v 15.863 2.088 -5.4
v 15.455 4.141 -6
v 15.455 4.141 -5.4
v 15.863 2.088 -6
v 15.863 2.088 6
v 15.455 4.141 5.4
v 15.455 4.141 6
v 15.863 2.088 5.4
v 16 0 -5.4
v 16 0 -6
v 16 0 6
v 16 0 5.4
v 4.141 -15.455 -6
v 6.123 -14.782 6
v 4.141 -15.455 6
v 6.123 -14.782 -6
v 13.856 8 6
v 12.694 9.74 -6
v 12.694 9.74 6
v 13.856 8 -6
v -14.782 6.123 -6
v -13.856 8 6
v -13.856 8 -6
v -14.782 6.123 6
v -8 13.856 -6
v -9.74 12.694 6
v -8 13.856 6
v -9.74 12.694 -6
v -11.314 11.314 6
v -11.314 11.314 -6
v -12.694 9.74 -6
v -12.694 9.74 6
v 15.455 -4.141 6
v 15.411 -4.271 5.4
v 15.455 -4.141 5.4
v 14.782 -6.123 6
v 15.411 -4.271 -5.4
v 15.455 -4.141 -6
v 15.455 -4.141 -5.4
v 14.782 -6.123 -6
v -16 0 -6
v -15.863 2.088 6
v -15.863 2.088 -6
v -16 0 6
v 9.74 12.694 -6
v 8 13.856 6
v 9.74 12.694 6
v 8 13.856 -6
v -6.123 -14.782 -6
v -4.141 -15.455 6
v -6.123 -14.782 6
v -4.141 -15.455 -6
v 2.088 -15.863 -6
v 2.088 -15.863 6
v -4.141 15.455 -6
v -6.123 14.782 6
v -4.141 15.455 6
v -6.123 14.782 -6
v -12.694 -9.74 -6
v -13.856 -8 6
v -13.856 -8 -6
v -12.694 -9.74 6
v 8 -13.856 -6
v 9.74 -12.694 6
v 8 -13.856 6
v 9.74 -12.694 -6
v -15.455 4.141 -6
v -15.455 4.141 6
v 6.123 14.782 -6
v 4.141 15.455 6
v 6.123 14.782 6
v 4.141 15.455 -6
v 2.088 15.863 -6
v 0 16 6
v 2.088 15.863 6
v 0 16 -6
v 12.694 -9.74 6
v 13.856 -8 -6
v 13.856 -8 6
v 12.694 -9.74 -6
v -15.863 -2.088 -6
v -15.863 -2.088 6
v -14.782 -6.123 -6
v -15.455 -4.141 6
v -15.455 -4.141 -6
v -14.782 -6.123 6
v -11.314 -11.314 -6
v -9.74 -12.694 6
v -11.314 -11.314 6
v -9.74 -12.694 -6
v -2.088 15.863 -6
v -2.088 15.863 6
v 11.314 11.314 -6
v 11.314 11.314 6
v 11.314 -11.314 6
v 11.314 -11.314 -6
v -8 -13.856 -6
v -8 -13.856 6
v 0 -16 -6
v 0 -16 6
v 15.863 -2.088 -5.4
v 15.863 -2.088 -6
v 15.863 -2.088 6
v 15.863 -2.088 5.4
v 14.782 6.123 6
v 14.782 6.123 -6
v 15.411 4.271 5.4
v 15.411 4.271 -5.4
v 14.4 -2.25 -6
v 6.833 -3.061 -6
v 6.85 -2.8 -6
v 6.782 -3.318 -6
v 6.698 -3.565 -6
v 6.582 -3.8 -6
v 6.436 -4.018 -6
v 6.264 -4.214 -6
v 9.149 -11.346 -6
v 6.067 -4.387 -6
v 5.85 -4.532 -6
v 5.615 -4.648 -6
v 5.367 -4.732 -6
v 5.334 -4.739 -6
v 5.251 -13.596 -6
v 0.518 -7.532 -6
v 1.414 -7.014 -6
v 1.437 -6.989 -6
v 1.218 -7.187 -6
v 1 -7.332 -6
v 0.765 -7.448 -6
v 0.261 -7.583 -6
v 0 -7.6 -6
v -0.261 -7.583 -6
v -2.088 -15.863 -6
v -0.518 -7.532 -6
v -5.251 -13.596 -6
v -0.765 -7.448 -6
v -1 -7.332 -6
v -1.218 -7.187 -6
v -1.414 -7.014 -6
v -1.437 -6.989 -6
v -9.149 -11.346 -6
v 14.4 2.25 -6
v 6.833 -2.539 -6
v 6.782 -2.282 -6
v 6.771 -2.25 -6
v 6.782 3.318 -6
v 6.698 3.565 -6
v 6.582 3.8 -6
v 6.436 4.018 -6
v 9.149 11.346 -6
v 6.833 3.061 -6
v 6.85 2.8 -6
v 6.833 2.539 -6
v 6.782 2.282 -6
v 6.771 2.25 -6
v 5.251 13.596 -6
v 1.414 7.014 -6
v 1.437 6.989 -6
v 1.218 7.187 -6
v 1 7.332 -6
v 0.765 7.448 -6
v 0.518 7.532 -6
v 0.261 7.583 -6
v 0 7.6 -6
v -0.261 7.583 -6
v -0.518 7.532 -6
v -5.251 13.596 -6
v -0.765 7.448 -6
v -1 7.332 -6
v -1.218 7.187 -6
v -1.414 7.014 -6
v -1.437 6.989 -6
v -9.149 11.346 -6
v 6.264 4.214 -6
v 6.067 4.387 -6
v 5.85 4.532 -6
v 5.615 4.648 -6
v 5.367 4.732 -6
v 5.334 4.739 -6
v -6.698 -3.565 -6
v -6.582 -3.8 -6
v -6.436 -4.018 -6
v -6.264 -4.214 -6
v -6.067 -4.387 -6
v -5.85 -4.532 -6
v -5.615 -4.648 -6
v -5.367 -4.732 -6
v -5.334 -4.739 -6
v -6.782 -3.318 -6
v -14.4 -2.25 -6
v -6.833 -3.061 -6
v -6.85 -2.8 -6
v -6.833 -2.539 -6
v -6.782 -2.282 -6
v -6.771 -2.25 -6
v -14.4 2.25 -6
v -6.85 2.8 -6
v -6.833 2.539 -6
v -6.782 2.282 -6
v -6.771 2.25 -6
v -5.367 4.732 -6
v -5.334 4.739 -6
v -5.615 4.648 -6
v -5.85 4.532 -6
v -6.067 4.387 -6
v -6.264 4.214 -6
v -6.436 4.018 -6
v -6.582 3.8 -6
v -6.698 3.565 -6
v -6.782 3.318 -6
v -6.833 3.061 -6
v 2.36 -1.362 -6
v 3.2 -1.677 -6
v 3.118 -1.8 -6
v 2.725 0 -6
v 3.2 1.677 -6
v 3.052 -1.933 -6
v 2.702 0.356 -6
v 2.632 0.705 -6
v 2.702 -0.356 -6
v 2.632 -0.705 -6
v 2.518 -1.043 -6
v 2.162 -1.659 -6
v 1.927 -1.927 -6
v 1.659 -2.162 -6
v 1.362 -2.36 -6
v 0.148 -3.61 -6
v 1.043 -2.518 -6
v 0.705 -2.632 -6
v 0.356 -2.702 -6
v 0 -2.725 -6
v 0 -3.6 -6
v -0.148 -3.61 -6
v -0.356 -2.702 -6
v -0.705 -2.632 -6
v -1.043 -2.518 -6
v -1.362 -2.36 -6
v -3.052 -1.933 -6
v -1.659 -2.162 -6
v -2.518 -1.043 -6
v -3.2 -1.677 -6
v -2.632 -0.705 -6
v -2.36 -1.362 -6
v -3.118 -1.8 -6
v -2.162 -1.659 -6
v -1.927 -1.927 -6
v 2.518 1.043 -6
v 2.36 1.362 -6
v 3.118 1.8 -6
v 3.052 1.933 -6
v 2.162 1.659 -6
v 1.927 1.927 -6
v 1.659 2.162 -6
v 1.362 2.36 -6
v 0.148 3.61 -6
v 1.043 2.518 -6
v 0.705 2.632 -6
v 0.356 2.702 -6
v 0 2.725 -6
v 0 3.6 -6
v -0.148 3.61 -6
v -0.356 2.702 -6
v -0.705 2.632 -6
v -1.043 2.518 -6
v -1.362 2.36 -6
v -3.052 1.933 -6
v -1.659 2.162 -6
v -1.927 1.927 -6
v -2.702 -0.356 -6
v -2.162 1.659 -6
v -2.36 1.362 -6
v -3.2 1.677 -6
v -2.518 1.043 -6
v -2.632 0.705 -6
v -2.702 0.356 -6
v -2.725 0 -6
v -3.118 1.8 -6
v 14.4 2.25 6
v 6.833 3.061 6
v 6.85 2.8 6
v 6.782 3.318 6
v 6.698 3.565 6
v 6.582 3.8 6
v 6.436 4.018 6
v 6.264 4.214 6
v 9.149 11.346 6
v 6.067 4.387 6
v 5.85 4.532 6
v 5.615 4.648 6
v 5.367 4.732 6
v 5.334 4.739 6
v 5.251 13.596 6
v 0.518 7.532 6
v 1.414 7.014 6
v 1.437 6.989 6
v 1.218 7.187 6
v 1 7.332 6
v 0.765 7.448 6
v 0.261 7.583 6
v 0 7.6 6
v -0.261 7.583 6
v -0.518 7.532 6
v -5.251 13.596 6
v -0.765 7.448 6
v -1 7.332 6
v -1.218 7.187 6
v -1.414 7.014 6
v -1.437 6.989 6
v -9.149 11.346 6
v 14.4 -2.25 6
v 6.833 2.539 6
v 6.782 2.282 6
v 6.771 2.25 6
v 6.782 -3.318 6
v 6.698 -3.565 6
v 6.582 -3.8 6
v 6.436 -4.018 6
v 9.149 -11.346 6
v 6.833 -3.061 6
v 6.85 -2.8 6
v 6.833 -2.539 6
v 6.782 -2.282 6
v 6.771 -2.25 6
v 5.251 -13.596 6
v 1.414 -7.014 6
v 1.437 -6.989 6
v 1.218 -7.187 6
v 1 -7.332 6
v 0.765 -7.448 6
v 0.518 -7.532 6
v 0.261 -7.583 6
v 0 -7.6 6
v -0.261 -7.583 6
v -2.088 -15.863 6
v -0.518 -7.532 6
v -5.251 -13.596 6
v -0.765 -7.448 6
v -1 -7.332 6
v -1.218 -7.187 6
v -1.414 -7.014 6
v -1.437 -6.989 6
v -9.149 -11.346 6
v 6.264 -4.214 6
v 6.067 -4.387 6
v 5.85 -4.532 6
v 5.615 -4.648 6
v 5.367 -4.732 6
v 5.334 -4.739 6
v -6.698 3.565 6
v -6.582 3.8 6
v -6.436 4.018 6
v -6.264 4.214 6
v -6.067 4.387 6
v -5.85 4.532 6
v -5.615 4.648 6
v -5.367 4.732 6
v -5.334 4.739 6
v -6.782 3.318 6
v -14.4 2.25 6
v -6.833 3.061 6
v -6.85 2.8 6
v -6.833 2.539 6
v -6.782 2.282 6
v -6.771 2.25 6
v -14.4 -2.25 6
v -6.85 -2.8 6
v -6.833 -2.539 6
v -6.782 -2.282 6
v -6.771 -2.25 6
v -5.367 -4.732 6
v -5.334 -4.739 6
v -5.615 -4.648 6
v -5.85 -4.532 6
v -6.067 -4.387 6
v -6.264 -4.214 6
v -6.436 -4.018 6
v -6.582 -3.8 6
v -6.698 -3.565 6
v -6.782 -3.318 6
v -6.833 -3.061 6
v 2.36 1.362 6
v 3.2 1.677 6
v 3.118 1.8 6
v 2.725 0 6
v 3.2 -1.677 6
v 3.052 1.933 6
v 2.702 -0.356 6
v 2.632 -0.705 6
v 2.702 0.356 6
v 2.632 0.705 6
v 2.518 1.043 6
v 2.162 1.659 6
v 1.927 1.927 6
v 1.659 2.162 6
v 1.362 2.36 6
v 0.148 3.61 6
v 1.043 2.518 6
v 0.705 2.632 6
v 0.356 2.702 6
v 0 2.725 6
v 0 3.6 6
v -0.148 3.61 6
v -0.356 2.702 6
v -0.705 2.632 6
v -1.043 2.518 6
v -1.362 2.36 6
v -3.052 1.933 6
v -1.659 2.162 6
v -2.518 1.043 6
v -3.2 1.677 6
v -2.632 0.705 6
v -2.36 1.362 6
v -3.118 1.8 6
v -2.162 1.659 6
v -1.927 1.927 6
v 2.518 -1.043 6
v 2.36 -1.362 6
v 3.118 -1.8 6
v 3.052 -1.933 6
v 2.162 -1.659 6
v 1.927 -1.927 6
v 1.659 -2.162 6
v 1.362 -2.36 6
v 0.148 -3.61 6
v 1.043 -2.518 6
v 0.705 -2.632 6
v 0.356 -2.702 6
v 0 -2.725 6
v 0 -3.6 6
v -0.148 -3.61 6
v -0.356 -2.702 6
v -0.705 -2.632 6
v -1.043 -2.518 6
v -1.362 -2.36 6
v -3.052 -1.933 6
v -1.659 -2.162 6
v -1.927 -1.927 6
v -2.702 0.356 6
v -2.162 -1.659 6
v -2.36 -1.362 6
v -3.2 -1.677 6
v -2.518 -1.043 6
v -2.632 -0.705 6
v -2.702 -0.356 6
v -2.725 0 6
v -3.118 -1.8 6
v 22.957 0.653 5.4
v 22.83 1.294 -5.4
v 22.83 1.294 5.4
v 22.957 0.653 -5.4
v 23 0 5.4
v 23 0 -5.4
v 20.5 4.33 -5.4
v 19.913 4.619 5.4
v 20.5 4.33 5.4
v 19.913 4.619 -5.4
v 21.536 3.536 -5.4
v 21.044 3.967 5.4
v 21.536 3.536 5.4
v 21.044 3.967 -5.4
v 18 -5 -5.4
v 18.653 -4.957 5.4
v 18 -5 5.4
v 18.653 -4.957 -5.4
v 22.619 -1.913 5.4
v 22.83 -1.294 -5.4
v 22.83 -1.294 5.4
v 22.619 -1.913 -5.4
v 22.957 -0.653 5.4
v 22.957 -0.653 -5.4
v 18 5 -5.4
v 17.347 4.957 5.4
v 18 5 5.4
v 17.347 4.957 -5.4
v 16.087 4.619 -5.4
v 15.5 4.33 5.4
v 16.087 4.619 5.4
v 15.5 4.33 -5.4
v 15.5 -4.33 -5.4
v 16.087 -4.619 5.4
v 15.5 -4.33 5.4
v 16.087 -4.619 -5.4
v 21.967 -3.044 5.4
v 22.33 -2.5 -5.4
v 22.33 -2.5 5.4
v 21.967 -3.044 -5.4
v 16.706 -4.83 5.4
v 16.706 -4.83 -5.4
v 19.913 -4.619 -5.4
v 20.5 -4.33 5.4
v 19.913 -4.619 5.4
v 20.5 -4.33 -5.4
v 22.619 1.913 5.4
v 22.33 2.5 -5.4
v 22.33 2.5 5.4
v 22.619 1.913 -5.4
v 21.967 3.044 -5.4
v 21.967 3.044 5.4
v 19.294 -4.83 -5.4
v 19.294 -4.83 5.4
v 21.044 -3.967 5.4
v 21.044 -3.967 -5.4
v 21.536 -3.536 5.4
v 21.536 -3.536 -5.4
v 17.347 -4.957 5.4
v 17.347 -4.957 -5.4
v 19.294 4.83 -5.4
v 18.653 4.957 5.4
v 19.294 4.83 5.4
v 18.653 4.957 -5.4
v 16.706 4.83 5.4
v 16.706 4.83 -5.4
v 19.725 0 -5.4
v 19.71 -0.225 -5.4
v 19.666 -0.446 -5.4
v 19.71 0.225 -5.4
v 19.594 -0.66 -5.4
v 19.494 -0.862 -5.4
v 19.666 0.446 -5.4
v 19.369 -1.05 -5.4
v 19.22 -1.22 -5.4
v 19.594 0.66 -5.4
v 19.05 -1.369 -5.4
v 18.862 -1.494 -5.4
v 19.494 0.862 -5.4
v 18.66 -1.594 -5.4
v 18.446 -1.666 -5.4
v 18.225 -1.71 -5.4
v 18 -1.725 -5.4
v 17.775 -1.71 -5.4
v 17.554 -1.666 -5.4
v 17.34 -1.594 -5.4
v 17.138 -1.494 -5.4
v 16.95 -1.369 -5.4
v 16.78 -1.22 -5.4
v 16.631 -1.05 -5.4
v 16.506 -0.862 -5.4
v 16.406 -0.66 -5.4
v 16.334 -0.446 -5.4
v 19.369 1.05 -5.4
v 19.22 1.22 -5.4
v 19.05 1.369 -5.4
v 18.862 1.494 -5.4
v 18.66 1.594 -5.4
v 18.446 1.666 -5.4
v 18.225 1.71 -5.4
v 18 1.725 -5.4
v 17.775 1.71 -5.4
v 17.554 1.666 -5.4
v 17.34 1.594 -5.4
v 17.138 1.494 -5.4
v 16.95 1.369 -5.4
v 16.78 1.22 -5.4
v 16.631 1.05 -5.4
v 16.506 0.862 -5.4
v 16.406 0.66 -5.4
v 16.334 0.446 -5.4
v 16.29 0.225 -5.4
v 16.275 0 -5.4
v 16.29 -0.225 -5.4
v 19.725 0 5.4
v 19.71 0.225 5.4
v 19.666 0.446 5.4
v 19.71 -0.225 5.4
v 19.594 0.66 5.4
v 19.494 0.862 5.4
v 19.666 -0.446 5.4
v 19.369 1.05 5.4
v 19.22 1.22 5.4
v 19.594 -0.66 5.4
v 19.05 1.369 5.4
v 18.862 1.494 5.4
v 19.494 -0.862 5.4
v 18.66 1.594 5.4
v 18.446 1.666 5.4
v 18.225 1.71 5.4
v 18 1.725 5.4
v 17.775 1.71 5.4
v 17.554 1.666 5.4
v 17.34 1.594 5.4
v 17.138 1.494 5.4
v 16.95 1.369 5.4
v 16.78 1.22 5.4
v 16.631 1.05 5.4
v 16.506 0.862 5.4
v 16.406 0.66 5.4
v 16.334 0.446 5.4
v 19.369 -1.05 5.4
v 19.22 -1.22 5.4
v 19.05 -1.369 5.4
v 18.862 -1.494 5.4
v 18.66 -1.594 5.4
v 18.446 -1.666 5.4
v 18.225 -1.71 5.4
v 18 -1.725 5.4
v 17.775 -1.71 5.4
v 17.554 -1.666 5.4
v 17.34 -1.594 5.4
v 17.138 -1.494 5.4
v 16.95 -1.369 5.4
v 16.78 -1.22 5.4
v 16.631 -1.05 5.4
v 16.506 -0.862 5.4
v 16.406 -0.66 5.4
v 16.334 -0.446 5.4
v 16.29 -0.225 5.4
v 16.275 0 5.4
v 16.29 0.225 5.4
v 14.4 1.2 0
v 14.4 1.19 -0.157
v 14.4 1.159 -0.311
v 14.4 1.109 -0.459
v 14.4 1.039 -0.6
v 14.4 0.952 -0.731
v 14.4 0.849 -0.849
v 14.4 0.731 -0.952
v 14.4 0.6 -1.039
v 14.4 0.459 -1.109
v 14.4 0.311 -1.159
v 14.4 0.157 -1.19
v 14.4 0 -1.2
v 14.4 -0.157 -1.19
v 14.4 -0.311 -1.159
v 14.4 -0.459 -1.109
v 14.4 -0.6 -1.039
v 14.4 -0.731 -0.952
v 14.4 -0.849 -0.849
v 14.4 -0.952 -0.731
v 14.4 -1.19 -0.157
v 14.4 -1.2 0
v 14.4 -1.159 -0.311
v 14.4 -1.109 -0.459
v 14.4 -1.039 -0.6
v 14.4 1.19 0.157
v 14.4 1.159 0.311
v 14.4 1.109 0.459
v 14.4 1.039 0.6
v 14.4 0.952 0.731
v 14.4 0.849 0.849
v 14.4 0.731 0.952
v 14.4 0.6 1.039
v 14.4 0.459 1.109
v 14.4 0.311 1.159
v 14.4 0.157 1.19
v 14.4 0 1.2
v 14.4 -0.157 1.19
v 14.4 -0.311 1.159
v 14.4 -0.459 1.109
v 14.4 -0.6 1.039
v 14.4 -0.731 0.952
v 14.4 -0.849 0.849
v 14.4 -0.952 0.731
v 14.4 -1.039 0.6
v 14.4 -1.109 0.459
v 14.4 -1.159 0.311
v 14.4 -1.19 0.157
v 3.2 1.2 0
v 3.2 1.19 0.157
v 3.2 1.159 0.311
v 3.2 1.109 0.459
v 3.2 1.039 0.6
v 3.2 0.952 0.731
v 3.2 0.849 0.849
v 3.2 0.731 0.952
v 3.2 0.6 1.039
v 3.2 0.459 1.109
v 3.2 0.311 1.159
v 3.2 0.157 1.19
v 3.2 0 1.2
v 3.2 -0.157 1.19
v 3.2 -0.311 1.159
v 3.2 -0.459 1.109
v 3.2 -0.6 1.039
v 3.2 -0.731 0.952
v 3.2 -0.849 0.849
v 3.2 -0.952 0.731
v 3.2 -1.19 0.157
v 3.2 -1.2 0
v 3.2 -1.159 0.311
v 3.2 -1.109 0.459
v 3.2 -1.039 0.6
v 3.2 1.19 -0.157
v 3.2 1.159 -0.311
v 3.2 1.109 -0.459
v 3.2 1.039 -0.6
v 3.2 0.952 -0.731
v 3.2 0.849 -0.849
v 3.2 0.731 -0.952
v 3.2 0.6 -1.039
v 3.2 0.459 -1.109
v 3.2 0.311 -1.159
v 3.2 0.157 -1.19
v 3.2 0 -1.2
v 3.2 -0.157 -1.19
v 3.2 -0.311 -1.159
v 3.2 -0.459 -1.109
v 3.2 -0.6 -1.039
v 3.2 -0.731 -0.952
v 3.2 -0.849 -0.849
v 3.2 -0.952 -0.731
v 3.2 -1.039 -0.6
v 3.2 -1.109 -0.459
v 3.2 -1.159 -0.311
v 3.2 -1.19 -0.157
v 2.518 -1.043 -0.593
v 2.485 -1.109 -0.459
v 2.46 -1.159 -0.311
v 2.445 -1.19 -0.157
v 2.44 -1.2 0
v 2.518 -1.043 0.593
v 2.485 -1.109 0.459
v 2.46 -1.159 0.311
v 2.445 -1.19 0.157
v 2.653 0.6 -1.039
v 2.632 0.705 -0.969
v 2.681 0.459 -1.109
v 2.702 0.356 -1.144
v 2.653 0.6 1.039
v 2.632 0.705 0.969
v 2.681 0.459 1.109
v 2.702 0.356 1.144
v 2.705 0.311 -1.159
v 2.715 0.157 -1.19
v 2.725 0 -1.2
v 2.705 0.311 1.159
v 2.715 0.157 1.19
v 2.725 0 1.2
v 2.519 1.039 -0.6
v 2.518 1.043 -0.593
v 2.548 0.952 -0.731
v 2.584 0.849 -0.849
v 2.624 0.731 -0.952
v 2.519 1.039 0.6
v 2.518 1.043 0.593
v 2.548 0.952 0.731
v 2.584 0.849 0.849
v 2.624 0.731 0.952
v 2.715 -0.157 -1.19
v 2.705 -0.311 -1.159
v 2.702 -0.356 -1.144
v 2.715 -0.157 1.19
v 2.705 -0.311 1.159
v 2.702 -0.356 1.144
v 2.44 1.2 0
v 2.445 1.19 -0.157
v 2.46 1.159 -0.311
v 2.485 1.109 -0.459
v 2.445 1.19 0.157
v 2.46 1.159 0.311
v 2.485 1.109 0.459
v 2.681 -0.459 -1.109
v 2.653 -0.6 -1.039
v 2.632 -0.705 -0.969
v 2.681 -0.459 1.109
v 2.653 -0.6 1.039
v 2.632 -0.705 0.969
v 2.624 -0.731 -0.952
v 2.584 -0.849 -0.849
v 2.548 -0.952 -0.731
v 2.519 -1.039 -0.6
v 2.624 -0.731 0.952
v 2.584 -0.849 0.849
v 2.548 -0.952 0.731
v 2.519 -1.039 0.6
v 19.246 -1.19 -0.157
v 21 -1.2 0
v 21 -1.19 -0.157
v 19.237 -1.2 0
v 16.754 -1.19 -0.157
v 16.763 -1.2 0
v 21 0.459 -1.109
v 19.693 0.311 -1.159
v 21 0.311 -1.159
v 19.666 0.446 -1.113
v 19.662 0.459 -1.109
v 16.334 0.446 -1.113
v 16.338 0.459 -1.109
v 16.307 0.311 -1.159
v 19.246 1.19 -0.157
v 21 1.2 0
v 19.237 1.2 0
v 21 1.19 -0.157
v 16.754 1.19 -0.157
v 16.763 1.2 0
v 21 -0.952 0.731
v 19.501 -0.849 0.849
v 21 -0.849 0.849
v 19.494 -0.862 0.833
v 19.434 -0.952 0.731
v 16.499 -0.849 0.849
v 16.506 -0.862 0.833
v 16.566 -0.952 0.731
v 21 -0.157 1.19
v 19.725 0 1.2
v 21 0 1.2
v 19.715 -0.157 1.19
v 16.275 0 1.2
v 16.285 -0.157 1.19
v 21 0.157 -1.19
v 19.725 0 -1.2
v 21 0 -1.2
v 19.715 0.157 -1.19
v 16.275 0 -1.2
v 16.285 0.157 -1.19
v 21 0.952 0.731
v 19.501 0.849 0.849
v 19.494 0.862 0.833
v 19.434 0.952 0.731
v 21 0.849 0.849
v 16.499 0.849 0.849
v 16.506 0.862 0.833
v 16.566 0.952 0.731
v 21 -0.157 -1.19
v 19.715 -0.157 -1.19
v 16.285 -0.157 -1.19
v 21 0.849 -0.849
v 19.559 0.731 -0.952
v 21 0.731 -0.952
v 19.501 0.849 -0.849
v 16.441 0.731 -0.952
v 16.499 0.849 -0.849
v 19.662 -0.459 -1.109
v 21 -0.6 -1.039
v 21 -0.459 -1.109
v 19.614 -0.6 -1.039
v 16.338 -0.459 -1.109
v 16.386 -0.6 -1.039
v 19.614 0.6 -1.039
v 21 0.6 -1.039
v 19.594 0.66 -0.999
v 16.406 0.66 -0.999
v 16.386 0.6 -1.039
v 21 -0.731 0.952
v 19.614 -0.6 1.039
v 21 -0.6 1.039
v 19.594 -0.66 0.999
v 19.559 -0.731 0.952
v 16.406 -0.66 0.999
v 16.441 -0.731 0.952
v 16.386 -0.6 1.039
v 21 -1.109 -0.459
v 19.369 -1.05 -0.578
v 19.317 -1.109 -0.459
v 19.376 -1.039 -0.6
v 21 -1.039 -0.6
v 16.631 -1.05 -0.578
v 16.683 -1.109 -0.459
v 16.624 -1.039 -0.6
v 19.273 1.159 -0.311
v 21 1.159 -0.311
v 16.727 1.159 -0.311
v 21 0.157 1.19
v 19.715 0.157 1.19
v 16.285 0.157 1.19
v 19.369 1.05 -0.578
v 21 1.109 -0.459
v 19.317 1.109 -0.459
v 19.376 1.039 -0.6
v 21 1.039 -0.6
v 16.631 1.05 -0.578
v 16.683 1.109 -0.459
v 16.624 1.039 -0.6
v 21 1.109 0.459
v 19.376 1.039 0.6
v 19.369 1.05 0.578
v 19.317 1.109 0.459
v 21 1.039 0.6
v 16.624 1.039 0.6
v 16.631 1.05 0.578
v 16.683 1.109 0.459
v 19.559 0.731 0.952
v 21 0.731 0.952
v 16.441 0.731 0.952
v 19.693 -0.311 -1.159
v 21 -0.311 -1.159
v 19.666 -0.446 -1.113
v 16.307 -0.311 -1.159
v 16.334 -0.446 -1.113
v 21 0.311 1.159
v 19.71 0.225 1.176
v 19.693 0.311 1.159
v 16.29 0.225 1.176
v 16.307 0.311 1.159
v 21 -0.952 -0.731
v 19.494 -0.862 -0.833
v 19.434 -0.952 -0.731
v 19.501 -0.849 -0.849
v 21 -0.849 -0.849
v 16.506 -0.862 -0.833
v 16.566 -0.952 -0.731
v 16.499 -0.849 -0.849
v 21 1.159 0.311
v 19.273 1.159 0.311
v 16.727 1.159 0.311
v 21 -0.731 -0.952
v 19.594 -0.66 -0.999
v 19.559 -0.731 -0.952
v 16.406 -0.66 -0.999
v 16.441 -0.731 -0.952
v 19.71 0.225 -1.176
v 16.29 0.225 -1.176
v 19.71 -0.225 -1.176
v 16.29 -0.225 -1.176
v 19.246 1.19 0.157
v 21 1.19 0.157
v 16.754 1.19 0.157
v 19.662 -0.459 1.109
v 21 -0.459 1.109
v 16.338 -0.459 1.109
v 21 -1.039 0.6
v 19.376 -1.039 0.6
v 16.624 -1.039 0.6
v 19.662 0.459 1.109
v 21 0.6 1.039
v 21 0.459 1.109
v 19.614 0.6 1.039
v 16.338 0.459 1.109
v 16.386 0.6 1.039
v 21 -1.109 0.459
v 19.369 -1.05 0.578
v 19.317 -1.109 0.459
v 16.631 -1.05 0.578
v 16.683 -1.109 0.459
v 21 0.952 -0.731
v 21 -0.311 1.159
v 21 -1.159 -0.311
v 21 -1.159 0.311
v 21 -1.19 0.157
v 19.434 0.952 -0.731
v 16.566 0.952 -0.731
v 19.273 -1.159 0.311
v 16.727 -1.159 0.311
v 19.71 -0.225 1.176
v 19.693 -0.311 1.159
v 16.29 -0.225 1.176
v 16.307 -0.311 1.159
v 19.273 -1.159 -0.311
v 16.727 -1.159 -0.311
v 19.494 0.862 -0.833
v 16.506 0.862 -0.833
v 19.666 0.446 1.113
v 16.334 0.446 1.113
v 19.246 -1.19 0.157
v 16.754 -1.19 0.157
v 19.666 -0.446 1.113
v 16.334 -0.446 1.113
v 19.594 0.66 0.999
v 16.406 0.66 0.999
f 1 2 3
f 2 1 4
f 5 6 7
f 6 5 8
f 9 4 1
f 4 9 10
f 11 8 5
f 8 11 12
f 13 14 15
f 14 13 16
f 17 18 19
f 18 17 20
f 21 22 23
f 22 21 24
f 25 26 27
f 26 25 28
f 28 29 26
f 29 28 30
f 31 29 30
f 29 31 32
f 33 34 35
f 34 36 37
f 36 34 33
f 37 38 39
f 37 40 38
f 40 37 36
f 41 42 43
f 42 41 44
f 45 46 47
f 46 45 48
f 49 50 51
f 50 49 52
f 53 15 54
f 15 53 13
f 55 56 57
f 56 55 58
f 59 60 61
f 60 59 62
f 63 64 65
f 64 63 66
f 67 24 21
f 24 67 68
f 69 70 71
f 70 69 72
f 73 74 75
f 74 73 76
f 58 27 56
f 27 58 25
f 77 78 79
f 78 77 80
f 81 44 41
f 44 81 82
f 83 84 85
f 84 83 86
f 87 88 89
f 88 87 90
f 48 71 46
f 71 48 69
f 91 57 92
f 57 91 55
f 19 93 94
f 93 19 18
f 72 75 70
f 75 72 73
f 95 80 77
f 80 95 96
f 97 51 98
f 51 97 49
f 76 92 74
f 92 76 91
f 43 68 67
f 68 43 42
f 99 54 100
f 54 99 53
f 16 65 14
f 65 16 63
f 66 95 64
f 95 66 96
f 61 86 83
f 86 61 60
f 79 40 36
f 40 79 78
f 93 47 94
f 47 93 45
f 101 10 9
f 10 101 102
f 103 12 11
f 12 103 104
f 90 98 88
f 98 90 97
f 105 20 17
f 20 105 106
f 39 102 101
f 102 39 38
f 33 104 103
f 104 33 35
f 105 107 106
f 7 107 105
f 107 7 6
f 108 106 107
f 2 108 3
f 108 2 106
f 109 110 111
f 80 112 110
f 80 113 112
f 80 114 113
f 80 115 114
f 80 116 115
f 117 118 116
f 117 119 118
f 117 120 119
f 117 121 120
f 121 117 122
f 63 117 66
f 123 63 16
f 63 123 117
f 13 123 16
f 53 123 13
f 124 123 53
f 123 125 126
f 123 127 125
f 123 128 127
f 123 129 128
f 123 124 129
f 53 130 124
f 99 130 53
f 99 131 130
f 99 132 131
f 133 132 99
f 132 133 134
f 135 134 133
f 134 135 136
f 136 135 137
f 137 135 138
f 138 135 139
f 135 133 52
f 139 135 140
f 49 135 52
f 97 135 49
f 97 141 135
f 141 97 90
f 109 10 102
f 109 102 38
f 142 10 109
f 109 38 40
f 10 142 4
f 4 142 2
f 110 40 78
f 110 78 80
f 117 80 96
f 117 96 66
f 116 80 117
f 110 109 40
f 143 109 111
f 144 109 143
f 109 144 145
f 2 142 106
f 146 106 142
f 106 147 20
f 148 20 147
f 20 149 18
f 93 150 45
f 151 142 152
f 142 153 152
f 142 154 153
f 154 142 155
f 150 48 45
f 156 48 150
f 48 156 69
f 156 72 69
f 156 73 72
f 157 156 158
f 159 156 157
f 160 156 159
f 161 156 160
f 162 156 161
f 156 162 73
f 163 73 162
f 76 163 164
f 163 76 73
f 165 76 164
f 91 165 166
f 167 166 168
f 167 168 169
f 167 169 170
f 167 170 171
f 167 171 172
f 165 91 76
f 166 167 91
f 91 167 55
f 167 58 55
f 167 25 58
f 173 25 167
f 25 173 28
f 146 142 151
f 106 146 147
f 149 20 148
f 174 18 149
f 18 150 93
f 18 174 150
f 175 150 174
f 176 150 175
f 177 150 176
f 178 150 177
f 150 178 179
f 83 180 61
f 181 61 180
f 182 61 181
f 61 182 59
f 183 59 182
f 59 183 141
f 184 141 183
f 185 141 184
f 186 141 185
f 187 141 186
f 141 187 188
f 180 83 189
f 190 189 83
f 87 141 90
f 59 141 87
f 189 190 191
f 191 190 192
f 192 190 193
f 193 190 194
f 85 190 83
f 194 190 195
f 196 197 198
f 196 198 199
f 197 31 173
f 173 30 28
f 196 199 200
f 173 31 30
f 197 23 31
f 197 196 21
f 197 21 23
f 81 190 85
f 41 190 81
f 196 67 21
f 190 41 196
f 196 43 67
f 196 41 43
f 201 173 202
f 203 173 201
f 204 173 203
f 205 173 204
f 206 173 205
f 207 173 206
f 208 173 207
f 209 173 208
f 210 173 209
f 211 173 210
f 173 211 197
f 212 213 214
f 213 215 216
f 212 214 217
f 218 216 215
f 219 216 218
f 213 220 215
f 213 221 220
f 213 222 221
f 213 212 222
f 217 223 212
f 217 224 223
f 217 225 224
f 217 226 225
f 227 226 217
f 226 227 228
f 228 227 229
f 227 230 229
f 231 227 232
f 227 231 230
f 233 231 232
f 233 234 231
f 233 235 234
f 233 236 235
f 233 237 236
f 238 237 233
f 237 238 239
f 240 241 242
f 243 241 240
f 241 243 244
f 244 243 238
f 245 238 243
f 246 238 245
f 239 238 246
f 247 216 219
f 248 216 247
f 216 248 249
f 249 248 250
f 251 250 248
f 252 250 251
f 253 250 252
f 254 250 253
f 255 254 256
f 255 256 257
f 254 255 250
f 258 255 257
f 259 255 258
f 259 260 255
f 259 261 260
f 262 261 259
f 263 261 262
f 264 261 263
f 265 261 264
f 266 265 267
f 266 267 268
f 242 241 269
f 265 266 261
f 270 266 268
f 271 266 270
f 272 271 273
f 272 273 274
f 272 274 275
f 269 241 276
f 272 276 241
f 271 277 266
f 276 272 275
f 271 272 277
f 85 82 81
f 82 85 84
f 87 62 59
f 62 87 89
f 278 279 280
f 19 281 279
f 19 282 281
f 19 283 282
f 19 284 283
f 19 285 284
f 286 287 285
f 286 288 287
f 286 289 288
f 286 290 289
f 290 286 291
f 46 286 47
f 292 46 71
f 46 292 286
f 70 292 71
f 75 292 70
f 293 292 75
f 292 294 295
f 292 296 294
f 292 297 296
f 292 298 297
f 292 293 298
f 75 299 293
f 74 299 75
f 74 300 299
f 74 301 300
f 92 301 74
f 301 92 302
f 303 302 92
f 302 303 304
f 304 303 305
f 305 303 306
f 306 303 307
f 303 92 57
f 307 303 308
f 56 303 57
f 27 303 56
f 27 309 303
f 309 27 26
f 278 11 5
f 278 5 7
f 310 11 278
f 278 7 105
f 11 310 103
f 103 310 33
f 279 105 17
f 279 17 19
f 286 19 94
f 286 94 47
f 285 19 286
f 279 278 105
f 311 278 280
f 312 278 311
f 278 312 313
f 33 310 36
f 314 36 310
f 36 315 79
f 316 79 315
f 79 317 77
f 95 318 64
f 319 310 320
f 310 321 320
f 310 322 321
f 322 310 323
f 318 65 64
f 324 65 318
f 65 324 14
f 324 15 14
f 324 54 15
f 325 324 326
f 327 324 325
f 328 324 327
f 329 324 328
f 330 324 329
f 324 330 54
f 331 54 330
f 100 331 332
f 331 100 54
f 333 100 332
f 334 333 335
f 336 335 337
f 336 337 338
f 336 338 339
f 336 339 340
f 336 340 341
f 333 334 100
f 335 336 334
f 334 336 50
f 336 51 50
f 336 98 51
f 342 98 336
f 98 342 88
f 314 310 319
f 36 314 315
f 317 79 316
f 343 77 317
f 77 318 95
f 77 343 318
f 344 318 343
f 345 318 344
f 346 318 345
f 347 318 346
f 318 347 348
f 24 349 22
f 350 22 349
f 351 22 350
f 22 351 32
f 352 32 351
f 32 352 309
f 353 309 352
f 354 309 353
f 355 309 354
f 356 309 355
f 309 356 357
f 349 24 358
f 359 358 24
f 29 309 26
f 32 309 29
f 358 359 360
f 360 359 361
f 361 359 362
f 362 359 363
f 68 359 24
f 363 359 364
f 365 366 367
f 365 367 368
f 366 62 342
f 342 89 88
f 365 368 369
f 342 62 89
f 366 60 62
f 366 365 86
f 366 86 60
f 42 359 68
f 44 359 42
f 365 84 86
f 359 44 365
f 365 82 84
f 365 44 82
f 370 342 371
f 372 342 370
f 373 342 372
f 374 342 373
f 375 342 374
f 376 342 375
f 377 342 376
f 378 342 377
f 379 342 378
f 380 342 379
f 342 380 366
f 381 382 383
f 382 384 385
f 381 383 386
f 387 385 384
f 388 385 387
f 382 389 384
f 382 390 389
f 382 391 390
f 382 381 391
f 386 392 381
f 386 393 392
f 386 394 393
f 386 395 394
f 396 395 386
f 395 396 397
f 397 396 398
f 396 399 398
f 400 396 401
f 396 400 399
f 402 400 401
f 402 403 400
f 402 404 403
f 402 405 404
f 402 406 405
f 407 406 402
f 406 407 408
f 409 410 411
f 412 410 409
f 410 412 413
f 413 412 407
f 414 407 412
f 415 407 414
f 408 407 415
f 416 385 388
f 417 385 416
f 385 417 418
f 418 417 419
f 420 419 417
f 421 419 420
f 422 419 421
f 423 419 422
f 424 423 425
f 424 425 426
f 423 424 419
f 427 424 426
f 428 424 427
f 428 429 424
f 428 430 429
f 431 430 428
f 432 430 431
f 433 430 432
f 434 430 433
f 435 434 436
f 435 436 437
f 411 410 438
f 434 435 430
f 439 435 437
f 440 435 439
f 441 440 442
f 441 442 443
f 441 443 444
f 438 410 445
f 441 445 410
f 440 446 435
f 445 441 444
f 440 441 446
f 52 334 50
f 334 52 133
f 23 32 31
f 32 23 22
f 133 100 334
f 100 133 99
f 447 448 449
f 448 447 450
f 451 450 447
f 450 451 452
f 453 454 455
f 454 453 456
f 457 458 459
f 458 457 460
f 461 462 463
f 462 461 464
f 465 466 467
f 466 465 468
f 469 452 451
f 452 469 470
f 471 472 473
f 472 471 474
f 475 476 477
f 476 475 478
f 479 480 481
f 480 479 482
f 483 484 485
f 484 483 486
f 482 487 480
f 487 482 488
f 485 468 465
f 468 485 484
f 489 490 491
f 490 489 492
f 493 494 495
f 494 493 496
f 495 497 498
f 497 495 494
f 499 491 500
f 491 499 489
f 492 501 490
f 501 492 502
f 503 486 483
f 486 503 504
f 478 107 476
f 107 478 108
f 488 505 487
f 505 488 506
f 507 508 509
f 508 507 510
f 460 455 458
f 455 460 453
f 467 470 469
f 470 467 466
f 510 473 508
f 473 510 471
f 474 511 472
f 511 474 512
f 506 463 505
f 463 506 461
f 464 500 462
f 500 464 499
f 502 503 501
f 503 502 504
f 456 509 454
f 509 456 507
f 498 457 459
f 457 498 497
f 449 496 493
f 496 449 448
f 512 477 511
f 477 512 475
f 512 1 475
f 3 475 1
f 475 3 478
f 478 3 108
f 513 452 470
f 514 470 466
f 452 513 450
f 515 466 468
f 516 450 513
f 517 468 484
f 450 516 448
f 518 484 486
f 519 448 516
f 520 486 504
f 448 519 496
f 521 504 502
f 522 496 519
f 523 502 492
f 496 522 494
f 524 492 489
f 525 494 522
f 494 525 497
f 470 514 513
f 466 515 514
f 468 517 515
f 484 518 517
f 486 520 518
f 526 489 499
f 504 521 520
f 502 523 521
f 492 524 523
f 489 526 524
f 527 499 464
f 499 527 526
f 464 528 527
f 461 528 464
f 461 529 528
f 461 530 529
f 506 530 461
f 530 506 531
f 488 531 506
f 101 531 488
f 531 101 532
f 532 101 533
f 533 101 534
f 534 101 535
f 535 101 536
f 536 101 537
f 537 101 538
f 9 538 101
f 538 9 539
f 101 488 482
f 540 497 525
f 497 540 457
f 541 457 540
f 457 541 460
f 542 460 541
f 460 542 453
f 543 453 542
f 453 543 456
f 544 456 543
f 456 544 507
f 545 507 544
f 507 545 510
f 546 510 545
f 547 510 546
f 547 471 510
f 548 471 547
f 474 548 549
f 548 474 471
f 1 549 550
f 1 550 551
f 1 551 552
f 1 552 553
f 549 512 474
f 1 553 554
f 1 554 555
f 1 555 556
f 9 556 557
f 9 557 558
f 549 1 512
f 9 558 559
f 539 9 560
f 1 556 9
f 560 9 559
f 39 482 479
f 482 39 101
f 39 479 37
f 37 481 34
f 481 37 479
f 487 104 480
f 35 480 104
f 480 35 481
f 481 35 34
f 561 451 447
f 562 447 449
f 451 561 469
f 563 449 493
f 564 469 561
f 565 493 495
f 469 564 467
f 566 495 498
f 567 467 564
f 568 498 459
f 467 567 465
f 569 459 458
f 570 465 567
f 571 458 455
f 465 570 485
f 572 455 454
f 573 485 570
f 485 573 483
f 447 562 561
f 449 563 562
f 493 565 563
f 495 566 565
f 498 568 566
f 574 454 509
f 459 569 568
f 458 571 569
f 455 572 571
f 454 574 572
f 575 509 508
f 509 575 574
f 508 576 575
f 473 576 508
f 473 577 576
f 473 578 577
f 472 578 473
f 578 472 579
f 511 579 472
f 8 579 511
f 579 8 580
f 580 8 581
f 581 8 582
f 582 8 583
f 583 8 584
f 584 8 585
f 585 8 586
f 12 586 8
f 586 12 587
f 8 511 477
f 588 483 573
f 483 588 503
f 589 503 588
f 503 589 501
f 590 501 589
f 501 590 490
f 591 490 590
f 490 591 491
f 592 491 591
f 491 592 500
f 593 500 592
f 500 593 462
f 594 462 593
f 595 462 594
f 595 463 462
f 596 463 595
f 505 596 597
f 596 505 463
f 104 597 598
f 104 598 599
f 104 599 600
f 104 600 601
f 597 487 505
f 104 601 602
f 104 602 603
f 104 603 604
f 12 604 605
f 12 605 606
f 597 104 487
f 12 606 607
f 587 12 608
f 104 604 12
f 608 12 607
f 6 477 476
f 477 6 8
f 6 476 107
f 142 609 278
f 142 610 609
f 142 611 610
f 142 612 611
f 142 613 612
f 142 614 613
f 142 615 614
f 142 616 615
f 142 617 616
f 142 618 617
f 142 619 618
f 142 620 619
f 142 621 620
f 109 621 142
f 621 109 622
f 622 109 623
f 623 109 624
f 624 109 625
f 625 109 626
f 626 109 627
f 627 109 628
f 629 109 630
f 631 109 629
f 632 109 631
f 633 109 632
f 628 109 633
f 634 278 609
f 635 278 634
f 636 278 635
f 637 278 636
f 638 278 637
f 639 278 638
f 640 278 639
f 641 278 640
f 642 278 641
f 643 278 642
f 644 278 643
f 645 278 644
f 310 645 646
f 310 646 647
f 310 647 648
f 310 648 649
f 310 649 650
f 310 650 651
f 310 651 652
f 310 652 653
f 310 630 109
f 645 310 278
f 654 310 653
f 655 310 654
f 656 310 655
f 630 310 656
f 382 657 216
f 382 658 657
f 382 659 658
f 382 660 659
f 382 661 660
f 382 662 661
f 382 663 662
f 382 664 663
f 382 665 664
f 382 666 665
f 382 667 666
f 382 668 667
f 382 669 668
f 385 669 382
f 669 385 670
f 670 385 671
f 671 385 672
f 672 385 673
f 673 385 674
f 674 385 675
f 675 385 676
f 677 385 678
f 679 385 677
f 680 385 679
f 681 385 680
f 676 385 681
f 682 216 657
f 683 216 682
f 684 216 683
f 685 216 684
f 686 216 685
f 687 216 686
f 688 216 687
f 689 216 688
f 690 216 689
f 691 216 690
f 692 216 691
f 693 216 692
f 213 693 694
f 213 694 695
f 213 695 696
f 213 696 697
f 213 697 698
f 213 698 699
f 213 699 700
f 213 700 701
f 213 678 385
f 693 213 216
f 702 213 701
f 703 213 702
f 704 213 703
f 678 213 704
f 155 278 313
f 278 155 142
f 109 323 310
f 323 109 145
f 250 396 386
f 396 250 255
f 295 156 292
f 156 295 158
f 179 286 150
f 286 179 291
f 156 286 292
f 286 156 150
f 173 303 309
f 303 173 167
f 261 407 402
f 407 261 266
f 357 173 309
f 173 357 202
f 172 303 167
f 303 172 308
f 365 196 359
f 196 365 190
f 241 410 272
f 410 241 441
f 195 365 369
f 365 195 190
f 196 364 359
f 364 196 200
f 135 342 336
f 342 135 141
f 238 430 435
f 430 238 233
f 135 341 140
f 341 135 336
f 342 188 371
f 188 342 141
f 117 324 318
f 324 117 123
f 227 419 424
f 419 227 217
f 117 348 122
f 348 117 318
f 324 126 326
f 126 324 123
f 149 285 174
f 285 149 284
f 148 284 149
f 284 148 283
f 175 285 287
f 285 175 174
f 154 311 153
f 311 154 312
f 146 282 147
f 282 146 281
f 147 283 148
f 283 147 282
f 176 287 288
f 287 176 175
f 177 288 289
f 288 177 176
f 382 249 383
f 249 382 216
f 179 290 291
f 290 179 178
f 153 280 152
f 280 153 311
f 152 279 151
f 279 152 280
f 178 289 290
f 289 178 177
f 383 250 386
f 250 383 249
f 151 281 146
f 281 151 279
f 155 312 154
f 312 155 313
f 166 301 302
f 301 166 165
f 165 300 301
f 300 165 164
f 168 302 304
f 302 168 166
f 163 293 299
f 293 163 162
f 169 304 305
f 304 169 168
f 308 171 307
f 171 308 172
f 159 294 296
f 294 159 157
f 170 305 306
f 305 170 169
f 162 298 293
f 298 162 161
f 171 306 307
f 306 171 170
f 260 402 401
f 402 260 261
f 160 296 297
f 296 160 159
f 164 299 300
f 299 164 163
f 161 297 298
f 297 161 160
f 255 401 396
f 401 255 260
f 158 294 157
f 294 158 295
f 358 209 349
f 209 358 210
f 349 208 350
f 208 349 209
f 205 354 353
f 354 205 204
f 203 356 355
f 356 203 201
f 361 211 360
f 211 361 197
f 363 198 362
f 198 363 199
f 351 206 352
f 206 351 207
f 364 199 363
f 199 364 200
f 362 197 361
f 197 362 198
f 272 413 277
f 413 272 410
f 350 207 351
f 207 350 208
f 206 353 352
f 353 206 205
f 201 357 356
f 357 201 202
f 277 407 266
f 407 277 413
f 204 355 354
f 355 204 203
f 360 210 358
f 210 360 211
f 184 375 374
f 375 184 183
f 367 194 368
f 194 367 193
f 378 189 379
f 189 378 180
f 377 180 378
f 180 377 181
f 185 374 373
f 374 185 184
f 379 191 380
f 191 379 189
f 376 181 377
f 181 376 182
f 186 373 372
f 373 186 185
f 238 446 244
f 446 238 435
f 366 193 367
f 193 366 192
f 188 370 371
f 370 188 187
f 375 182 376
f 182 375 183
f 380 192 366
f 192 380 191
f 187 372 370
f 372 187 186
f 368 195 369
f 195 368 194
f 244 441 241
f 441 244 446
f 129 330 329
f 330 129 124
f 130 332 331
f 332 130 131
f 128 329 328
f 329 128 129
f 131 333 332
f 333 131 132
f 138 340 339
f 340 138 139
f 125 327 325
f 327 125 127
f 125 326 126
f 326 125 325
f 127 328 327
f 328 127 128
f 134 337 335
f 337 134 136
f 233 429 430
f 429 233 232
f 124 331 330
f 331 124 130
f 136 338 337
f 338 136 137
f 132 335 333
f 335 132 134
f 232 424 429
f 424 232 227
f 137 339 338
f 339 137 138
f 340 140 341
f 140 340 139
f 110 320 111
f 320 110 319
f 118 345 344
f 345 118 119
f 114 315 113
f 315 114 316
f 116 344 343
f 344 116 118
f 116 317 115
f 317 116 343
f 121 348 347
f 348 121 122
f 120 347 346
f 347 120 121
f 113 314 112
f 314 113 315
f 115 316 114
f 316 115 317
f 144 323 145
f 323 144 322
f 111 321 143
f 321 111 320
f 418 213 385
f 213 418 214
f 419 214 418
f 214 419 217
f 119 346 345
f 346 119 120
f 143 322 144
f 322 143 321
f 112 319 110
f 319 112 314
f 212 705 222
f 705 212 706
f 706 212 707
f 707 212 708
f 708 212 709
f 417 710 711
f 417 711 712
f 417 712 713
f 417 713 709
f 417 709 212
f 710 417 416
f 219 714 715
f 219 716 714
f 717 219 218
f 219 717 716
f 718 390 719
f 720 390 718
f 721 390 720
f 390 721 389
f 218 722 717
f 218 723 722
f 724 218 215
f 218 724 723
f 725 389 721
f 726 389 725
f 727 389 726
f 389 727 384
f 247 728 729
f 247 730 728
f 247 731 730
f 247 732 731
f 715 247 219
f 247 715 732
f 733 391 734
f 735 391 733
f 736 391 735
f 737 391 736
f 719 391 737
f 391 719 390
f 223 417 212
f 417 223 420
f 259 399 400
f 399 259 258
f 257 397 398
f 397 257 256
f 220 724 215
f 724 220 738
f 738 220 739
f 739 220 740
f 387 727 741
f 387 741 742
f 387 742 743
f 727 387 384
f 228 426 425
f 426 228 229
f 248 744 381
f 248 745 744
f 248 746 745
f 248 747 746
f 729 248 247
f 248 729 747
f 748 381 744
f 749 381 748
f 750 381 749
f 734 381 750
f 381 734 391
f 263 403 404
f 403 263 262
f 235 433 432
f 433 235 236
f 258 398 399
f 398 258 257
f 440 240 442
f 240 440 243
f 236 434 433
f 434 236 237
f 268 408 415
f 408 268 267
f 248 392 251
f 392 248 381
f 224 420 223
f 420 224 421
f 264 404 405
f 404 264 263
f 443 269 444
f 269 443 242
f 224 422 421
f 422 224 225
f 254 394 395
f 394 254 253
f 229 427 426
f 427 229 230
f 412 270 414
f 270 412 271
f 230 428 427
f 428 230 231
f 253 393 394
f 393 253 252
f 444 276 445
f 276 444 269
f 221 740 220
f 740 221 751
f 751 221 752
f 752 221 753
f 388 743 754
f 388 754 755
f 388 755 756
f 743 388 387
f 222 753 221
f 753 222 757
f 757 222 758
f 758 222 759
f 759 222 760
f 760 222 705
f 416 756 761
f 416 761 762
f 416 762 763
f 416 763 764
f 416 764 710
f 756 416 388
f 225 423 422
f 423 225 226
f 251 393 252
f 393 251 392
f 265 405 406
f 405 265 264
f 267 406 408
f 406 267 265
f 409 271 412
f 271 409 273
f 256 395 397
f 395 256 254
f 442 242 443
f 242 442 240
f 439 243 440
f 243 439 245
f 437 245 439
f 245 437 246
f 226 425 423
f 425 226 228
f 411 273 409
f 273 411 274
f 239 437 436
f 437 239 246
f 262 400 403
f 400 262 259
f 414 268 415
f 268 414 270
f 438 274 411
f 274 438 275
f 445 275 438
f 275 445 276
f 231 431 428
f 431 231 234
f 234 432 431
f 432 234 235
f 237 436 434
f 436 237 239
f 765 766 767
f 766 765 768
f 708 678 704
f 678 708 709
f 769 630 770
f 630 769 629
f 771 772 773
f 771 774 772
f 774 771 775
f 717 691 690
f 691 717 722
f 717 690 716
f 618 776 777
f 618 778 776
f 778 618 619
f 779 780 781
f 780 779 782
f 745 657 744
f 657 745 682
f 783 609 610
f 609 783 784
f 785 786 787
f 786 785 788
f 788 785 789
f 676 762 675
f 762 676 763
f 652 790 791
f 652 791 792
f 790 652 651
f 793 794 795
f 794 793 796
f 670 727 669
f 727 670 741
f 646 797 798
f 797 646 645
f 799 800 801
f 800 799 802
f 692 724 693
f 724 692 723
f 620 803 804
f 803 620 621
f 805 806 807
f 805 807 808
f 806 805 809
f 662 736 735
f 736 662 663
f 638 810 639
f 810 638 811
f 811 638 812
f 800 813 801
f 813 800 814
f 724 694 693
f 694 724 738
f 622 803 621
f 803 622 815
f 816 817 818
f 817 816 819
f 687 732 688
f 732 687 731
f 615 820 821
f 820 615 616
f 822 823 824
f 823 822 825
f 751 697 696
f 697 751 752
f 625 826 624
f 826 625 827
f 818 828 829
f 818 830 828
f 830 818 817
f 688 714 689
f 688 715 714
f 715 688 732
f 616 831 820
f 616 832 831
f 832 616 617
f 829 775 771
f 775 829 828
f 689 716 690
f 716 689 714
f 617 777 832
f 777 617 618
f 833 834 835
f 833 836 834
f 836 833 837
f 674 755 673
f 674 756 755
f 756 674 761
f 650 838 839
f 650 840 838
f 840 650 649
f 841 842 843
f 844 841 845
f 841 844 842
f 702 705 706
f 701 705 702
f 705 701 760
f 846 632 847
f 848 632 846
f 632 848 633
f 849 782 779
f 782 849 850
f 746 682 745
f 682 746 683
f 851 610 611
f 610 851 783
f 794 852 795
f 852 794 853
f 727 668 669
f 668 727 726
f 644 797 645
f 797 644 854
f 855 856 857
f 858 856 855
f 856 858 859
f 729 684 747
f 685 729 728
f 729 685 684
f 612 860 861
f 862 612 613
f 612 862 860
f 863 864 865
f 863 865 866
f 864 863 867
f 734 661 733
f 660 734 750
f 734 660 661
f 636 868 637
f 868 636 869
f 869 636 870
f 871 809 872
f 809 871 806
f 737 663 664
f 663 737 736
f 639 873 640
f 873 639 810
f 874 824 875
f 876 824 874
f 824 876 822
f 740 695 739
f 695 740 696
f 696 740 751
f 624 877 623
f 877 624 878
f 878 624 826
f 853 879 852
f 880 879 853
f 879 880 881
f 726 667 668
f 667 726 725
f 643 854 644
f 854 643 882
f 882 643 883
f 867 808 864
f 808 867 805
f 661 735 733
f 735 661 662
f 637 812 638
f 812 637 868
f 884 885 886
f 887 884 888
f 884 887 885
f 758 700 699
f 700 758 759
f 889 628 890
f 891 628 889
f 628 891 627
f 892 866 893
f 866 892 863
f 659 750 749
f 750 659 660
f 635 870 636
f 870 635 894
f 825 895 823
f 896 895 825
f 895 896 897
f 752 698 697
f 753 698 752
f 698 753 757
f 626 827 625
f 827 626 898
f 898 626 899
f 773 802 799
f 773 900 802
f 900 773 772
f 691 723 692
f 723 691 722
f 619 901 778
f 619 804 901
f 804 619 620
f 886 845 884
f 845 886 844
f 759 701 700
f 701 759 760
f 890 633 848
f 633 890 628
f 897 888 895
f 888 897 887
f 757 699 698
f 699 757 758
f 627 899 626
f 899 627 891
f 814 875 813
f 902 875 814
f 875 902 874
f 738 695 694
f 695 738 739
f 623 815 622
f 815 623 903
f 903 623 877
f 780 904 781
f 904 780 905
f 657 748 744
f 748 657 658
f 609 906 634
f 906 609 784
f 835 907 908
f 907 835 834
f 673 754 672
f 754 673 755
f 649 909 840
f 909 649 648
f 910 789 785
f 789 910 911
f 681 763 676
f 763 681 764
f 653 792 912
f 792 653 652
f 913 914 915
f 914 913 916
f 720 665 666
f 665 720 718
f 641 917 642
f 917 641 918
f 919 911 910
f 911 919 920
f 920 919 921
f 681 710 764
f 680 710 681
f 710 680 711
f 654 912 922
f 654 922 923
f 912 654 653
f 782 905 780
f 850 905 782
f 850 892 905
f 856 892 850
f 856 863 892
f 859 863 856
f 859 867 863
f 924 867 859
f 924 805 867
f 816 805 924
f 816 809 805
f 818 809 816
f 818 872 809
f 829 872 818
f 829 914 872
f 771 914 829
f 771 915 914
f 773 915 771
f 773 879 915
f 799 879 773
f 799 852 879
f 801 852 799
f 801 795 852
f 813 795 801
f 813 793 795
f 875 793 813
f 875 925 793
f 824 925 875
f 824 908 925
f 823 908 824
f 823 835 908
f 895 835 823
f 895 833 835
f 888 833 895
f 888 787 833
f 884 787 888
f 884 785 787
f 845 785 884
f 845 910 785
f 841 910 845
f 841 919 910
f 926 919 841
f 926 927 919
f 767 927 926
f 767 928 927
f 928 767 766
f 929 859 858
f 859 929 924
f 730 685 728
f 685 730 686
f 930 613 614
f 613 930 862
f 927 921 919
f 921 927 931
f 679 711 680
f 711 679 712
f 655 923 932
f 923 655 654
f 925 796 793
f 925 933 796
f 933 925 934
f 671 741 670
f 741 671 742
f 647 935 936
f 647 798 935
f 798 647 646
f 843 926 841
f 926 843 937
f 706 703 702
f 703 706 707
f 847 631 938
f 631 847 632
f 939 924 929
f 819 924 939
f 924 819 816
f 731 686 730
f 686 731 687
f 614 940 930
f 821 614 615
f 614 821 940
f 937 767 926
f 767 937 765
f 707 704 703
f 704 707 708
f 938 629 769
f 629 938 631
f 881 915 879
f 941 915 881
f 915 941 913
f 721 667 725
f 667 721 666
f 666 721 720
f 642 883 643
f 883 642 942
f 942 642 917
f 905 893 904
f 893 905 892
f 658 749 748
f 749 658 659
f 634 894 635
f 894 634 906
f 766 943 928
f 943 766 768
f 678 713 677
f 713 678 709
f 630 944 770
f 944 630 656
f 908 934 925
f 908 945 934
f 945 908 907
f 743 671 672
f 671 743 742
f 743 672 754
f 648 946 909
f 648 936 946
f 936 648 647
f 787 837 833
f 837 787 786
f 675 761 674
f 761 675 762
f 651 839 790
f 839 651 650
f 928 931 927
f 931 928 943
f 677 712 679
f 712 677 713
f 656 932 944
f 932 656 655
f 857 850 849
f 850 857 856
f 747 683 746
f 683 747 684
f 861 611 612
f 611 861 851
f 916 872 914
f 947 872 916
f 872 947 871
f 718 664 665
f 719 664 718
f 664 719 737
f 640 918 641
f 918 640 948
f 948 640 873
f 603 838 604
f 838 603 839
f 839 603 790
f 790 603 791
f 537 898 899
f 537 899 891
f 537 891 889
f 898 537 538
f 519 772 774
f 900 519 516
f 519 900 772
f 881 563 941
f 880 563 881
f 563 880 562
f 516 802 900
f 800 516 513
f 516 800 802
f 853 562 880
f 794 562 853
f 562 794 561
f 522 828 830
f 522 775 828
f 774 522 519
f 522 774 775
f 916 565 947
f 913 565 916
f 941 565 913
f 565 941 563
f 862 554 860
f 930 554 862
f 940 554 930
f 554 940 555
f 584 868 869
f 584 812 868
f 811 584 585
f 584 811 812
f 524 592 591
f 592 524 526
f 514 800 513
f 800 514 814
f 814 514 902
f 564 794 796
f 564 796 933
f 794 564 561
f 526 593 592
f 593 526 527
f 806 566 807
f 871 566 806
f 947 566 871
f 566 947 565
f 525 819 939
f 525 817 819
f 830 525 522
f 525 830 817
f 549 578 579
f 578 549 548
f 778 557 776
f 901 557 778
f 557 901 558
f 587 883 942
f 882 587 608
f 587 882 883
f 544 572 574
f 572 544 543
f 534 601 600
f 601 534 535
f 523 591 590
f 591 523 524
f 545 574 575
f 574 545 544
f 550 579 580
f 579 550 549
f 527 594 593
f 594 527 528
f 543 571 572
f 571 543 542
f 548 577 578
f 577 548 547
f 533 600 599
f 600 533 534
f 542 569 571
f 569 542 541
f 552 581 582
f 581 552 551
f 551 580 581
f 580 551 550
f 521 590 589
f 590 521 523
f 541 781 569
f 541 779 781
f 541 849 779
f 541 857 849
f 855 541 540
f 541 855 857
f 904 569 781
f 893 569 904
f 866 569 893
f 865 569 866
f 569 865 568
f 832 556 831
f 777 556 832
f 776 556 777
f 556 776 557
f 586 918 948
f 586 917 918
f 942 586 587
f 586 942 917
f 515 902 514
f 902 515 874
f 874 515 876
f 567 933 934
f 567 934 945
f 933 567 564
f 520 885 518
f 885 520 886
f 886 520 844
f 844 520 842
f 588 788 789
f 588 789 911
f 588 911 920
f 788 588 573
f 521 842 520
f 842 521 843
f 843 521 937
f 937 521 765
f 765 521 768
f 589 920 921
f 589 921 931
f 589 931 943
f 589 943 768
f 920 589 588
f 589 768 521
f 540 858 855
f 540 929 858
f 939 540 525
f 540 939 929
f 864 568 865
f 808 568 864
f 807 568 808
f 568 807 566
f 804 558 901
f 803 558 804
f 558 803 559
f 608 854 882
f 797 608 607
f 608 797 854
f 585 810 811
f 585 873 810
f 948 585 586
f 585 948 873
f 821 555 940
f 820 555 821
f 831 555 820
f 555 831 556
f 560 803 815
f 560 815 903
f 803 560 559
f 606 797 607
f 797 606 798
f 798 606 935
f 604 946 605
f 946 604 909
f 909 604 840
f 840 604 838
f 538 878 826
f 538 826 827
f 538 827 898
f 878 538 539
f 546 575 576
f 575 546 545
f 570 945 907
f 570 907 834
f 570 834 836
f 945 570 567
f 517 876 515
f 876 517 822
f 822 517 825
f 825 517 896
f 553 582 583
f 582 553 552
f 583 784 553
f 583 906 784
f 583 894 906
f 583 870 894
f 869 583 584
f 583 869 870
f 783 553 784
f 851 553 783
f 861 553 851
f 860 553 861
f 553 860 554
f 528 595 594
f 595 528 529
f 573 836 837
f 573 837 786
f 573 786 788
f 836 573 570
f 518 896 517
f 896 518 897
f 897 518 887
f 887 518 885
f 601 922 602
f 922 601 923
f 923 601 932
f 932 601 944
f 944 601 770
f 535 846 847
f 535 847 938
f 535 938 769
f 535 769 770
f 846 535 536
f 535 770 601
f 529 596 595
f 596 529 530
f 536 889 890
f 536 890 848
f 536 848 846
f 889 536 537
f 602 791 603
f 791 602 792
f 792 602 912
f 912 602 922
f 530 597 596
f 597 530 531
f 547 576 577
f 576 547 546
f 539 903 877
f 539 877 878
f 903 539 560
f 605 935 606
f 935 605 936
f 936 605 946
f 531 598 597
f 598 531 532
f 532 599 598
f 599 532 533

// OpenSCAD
// file: ../params.scad
// Vexamicus T0/T1 parametric dimensions (mm)
// Inspired by published Salto-class proportions — original geometry, not a CAD clone.

/* [Scale] */
// Overall linear scale vs nominal T1 (1.0 ≈ 240 mm body height class)
SCALE = 1.0;

/* [Body] */
BODY_W = 42 * SCALE;      // Y width
BODY_H = 38 * SCALE;      // Z height of core block
BODY_L = 55 * SCALE;      // X length
WALL = 2.4 * SCALE;
BATTERY_L = 48 * SCALE;
BATTERY_W = 18 * SCALE;
BATTERY_H = 14 * SCALE;

/* [Leg 4-bar] */
HIP_Z = -8 * SCALE;                 // hip joint below body center
FEMUR_L = 55 * SCALE;               // hip → knee
SHIN_L = 70 * SCALE;                // knee → foot
COUPLER_L = 48 * SCALE;             // parallel coupler
CRANK_L = 18 * SCALE;               // SEA output crank
LEG_THICK = 5 * SCALE;
LEG_WIDTH = 8 * SCALE;
BEARING_ID = 3.2;                   // M3 clearance
BEARING_OD = 10.0;                  // 623-ish pocket (simplified)

/* [Foot] */
TOE_R = 12 * SCALE;
ANKLE_PAD_H = 6 * SCALE;

/* [SEA hub] */
SEA_HUB_R = 16 * SCALE;
SEA_HUB_H = 12 * SCALE;
MOTOR_BORE = 5.2;                   // typical BLDC shaft
SPRING_SLOT_W = 4.5 * SCALE;

/* [Tail / reaction wheel] */
TAIL_BOOM_L = 35 * SCALE;
TAIL_WHEEL_R = 28 * SCALE;
TAIL_WHEEL_H = 8 * SCALE;
TAIL_SHAFT = 3.2;

/* [Thruster booms T2] */
THRUST_BOOM_L = 45 * SCALE;
THRUST_ARM_ROLL = 40 * SCALE;       // ~ half of Salto 80mm moment arm at SCALE~1
THRUST_MOTOR_R = 6 * SCALE;

/* [Clearance / print] */
CLEAR = 0.25;
$fn = 48;

function mm(x) = x;
// file: ../vitamins.scad
// Shared primitives
include <params.scad>

module round_rect(size, r=1.5, center=false) {
    // size = [x,y,z]
    x=size[0]; y=size[1]; z=size[2];
    translate(center ? [-x/2,-y/2,-z/2] : [0,0,0])
    minkowski() {
        cube([max(0.01,x-2*r), max(0.01,y-2*r), max(0.01,z)], center=false);
        cylinder(r=r, h=0.01, center=false);
    }
}

module bearing_pocket(h=LEG_THICK+0.2) {
    cylinder(d=BEARING_OD + CLEAR, h=h, center=true);
}

module bolt_hole(d=BEARING_ID, h=40) {
    cylinder(d=d + CLEAR, h=h, center=true);
}

module carbon_tube(L=50, od=4, id=3) {
    difference() {
        cylinder(d=od, h=L, center=true);
        cylinder(d=id, h=L+1, center=true);
    }
}

module motor_standoff_pattern(spacing=16, h=6, d=2.2) {
    for (a=[0:90:270])
        rotate([0,0,a]) translate([spacing/2,0,0])
            cylinder(d=d, h=h, center=true);
}
// main file
// SEA torsion hub — motor shaft → latex pack → crank
include <../vitamins.scad>

module sea_hub() {
    difference() {
        union() {
            cylinder(r=SEA_HUB_R, h=SEA_HUB_H, center=true);
            // crank arm
            hull() {
                cylinder(d=10, h=SEA_HUB_H*0.7, center=true);
                translate([CRANK_L, 0, 0])
                    cylinder(d=8, h=SEA_HUB_H*0.7, center=true);
            }
            translate([CRANK_L, 0, 0])
                cylinder(d=10, h=SEA_HUB_H*0.9, center=true);
        }
        // motor shaft
        cylinder(d=MOTOR_BORE + CLEAR, h=SEA_HUB_H+2, center=true);
        // set screw
        translate([0, 0, 0]) rotate([0,90,0])
            cylinder(d=2.4, h=SEA_HUB_R+5);
        // latex slots (radial)
        for (a=[0:60:300])
            rotate([0,0,a])
                translate([SEA_HUB_R*0.55, 0, 0])
                    cube([SEA_HUB_R*0.7, SPRING_SLOT_W, SEA_HUB_H+1], center=true);
        // crank joint
        translate([CRANK_L, 0, 0]) bolt_hole(h=SEA_HUB_H+2);
        // lightening
        for (a=[30:60:330])
            rotate([0,0,a]) translate([SEA_HUB_R*0.35,0,0])
                cylinder(d=4, h=SEA_HUB_H+1, center=true);
    }
}

sea_hub();
